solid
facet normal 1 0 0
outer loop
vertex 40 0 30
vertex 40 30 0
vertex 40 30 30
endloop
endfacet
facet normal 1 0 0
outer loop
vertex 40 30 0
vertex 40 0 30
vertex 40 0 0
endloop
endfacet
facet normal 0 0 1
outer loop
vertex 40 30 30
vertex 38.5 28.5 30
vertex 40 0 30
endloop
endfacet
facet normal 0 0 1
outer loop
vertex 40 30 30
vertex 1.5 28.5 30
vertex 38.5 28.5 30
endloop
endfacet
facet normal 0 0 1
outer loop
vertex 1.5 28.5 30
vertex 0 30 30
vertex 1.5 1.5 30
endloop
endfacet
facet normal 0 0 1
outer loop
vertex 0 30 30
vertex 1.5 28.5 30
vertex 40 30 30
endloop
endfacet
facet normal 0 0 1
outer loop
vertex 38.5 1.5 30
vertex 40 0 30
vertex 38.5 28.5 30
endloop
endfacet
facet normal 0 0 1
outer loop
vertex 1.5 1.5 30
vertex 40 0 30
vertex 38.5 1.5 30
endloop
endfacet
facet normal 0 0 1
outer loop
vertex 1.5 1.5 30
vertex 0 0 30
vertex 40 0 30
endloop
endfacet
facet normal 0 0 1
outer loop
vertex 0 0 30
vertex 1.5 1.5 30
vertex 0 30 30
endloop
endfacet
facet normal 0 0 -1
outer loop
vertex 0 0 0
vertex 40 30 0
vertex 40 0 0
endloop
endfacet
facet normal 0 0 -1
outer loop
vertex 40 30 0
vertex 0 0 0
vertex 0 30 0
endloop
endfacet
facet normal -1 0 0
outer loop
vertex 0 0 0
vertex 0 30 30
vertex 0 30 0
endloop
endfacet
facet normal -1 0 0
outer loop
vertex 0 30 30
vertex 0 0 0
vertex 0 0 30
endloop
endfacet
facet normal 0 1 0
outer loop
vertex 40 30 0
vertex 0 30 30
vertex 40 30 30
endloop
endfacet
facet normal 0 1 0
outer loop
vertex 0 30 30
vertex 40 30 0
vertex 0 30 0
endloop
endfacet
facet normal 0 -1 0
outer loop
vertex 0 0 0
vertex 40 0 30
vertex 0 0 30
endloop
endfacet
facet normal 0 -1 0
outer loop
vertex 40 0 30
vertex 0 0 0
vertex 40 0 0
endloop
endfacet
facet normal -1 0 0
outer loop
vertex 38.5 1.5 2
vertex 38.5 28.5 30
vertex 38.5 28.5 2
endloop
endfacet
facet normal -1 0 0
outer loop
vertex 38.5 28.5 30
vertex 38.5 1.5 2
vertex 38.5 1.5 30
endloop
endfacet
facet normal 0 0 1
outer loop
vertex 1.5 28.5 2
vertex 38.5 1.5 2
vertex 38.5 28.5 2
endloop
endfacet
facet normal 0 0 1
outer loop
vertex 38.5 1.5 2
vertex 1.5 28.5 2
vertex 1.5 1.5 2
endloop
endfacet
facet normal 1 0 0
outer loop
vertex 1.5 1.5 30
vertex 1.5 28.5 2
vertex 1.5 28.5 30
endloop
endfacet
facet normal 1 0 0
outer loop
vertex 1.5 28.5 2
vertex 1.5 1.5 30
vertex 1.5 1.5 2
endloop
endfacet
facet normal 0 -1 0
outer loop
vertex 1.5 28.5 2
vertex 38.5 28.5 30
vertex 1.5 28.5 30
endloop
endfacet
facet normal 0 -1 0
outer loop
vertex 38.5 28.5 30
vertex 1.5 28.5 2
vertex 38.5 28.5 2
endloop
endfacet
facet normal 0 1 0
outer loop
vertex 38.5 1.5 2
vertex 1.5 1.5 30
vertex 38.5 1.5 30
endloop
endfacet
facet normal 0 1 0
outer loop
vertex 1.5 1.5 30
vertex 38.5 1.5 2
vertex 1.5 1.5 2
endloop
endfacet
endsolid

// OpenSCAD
$fn = 32;

// ----------------------------------------------------------------------
// Open box: 1.5 mm walls
// ----------------------------------------------------------------------

// --- parameters (mm) ---
box_l = 40;               // outer length, X
box_w = 30;               // outer width, Y
box_h = 30;               // outer height, Z
wall = 1.5;               // wall thickness
floor = 2;                // floor thickness

difference() {
  cube([box_l, box_w, box_h]);
  translate([wall, wall, floor])
    cube([box_l - 2 * wall, box_w - 2 * wall, box_h]);
}
